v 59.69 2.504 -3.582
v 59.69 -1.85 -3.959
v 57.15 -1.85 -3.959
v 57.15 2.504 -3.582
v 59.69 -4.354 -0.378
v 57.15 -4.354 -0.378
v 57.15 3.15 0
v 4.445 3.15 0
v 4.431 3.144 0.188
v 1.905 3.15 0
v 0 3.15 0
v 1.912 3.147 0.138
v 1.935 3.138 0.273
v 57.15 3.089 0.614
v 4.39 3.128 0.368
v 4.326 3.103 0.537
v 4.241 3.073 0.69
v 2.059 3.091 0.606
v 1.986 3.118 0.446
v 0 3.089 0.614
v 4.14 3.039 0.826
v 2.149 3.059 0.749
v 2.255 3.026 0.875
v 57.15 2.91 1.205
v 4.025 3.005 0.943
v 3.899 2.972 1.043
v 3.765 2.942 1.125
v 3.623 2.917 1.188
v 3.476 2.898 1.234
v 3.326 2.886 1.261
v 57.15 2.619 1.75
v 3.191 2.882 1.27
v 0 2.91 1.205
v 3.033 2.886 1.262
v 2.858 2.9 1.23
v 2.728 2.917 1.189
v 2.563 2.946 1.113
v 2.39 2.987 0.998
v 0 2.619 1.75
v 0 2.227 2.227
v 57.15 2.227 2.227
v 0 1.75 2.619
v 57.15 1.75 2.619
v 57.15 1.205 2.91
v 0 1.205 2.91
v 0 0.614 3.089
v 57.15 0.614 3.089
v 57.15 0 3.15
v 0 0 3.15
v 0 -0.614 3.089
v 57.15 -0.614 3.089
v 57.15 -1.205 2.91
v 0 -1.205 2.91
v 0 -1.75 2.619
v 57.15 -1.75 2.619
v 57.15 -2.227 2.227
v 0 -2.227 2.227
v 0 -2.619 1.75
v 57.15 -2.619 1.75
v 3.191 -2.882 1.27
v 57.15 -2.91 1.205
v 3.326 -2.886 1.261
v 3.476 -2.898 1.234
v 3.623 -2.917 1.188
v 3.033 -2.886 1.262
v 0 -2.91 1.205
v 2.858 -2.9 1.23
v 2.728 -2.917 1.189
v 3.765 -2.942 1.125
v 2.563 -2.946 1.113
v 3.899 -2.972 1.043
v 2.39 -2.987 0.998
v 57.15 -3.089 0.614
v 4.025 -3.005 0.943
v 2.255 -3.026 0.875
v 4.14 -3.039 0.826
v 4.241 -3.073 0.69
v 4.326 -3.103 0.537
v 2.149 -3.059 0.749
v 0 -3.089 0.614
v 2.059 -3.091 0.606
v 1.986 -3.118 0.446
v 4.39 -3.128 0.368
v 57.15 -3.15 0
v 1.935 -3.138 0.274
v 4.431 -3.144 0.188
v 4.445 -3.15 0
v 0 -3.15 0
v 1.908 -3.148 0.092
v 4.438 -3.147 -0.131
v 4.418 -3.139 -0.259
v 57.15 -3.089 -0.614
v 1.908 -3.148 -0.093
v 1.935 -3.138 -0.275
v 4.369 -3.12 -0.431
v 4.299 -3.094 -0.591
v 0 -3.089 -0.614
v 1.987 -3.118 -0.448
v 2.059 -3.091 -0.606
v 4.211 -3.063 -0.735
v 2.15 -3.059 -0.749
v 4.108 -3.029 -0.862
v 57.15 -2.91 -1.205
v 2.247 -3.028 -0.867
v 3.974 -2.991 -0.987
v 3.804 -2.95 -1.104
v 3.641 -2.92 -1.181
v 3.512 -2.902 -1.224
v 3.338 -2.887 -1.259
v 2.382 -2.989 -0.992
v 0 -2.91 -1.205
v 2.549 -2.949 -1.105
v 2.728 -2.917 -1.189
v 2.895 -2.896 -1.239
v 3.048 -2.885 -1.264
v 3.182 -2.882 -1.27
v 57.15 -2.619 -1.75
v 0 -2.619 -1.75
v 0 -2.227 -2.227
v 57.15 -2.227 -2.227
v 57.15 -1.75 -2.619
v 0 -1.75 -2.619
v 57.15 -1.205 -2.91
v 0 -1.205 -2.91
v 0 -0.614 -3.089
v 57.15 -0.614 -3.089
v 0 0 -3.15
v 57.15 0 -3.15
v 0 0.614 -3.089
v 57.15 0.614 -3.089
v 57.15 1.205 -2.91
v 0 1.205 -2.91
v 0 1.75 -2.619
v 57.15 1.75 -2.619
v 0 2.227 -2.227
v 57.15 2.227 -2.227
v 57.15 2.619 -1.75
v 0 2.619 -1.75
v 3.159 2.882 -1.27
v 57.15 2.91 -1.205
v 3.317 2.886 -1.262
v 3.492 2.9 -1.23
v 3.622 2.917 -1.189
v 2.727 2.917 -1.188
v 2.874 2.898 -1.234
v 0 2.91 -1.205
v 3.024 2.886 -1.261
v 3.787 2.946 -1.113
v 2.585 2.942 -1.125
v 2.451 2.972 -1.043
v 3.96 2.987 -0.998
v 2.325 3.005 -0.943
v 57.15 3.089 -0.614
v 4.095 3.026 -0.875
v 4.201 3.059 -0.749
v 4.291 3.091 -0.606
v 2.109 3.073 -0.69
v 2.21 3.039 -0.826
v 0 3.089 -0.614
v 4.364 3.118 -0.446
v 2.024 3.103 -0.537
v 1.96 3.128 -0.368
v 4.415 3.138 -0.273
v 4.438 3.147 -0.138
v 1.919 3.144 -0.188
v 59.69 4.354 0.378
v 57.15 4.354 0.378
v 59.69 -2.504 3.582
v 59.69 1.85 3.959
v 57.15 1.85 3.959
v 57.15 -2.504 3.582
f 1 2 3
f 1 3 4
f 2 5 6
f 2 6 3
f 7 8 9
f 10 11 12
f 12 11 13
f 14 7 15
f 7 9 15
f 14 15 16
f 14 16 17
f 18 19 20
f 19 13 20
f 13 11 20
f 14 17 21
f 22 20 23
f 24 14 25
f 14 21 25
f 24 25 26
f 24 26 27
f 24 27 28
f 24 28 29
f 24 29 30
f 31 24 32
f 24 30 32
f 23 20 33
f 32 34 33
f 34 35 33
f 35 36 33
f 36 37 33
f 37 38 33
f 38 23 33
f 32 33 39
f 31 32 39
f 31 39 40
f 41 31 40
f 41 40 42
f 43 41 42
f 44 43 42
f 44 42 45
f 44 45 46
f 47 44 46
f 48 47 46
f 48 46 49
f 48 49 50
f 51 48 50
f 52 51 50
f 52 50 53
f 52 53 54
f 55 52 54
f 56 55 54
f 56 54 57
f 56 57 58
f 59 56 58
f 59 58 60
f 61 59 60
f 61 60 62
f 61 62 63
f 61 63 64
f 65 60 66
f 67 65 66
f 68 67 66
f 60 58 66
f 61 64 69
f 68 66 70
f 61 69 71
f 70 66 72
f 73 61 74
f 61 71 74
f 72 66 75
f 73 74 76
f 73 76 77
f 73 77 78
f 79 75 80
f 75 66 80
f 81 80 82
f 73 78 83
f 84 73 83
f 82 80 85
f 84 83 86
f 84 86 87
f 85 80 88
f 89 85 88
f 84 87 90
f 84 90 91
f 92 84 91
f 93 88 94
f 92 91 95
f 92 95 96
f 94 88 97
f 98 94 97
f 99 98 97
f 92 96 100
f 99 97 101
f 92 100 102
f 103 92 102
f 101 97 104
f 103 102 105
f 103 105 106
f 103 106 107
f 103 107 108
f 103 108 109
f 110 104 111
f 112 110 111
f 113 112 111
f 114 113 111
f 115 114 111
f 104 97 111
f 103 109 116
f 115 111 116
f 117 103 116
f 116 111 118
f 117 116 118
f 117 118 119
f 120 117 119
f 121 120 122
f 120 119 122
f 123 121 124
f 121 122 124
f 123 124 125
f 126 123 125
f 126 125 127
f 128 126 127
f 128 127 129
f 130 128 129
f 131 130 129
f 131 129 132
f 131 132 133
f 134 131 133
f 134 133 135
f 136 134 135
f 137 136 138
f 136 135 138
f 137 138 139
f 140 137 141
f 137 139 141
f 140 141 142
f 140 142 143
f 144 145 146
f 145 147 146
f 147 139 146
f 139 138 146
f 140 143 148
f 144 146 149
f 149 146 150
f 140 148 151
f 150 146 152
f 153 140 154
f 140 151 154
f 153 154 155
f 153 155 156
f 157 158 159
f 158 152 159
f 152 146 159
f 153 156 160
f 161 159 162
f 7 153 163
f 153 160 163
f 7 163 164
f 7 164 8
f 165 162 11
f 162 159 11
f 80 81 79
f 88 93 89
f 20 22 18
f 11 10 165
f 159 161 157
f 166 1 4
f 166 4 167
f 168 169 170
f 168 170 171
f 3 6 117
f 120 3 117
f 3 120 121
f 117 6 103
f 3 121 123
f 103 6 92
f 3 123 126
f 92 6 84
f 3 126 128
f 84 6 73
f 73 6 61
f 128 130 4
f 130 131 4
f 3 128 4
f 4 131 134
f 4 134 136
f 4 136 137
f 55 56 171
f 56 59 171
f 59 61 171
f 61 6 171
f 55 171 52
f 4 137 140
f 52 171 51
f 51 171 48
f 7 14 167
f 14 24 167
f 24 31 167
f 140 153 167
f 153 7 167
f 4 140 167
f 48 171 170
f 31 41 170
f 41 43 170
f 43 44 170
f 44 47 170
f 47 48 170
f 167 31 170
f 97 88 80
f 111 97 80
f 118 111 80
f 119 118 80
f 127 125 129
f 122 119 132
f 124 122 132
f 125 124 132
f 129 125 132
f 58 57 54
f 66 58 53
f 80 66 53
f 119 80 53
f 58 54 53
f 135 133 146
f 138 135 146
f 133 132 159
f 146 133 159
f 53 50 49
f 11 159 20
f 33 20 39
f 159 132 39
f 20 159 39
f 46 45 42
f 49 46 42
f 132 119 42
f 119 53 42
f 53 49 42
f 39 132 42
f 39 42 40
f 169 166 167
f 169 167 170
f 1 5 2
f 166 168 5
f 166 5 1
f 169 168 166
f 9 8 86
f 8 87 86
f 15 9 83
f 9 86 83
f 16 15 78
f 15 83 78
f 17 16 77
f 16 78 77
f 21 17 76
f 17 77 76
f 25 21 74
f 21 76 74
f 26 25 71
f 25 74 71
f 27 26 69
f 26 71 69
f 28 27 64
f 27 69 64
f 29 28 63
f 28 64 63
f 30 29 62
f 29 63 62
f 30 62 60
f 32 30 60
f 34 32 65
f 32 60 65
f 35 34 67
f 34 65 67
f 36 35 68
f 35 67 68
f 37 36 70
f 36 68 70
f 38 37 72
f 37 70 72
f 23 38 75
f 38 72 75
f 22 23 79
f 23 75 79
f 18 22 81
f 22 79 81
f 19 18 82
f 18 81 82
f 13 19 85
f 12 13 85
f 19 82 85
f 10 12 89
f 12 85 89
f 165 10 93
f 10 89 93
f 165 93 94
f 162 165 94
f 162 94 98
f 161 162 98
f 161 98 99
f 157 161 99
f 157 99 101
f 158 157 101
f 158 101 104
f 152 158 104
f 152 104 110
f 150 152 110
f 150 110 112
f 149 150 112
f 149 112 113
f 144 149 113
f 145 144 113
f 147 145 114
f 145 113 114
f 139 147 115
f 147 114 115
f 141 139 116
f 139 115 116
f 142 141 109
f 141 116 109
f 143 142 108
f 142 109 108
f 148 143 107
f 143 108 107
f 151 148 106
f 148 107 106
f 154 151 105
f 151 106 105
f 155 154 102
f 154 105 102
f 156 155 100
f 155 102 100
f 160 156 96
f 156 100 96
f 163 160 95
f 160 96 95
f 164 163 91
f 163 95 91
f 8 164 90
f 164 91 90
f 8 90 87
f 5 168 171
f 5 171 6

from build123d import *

# Parameters (mm, degrees)
F0_R     = 3.1496
F1_DEPTH = 59.69
F2_R     = 1.27
F3_DEPTH = 17.272
F4_R     = 3.1496
F5_DEPTH = 2.54
F6_DEPTH = 14.2494


with BuildPart() as f1:
    # F0 (on Right) → F1 (new body)
    with BuildSketch(Plane.YZ):
        Circle(F0_R)
    extrude(amount=F1_DEPTH)

    # F2 (on Front) → F3 (cut)
    with BuildSketch(Plane.XZ):
        with Locations((3.175, 0)):
            Circle(F2_R)
    extrude(amount=F3_DEPTH, mode=Mode.SUBTRACT)

    # F4 (on face) → F5 (join)
    with BuildSketch(Plane.YZ.offset(59.69)):
        Polygon((2.503989, -3.581569), (4.353724, 0.377734), (1.849735, 3.959303), (-2.503989, 3.581569), (-4.353724, -0.377734), (-1.849735, -3.959303), align=None)
        Circle(F4_R, mode=Mode.SUBTRACT)
    extrude(amount=-F5_DEPTH)

    # F2 (on Front) → F6 (cut)
    with BuildSketch(Plane.XZ):
        with Locations((3.175, 0)):
            Circle(F2_R)
    extrude(amount=-F6_DEPTH, mode=Mode.SUBTRACT)


solid = f1.part
